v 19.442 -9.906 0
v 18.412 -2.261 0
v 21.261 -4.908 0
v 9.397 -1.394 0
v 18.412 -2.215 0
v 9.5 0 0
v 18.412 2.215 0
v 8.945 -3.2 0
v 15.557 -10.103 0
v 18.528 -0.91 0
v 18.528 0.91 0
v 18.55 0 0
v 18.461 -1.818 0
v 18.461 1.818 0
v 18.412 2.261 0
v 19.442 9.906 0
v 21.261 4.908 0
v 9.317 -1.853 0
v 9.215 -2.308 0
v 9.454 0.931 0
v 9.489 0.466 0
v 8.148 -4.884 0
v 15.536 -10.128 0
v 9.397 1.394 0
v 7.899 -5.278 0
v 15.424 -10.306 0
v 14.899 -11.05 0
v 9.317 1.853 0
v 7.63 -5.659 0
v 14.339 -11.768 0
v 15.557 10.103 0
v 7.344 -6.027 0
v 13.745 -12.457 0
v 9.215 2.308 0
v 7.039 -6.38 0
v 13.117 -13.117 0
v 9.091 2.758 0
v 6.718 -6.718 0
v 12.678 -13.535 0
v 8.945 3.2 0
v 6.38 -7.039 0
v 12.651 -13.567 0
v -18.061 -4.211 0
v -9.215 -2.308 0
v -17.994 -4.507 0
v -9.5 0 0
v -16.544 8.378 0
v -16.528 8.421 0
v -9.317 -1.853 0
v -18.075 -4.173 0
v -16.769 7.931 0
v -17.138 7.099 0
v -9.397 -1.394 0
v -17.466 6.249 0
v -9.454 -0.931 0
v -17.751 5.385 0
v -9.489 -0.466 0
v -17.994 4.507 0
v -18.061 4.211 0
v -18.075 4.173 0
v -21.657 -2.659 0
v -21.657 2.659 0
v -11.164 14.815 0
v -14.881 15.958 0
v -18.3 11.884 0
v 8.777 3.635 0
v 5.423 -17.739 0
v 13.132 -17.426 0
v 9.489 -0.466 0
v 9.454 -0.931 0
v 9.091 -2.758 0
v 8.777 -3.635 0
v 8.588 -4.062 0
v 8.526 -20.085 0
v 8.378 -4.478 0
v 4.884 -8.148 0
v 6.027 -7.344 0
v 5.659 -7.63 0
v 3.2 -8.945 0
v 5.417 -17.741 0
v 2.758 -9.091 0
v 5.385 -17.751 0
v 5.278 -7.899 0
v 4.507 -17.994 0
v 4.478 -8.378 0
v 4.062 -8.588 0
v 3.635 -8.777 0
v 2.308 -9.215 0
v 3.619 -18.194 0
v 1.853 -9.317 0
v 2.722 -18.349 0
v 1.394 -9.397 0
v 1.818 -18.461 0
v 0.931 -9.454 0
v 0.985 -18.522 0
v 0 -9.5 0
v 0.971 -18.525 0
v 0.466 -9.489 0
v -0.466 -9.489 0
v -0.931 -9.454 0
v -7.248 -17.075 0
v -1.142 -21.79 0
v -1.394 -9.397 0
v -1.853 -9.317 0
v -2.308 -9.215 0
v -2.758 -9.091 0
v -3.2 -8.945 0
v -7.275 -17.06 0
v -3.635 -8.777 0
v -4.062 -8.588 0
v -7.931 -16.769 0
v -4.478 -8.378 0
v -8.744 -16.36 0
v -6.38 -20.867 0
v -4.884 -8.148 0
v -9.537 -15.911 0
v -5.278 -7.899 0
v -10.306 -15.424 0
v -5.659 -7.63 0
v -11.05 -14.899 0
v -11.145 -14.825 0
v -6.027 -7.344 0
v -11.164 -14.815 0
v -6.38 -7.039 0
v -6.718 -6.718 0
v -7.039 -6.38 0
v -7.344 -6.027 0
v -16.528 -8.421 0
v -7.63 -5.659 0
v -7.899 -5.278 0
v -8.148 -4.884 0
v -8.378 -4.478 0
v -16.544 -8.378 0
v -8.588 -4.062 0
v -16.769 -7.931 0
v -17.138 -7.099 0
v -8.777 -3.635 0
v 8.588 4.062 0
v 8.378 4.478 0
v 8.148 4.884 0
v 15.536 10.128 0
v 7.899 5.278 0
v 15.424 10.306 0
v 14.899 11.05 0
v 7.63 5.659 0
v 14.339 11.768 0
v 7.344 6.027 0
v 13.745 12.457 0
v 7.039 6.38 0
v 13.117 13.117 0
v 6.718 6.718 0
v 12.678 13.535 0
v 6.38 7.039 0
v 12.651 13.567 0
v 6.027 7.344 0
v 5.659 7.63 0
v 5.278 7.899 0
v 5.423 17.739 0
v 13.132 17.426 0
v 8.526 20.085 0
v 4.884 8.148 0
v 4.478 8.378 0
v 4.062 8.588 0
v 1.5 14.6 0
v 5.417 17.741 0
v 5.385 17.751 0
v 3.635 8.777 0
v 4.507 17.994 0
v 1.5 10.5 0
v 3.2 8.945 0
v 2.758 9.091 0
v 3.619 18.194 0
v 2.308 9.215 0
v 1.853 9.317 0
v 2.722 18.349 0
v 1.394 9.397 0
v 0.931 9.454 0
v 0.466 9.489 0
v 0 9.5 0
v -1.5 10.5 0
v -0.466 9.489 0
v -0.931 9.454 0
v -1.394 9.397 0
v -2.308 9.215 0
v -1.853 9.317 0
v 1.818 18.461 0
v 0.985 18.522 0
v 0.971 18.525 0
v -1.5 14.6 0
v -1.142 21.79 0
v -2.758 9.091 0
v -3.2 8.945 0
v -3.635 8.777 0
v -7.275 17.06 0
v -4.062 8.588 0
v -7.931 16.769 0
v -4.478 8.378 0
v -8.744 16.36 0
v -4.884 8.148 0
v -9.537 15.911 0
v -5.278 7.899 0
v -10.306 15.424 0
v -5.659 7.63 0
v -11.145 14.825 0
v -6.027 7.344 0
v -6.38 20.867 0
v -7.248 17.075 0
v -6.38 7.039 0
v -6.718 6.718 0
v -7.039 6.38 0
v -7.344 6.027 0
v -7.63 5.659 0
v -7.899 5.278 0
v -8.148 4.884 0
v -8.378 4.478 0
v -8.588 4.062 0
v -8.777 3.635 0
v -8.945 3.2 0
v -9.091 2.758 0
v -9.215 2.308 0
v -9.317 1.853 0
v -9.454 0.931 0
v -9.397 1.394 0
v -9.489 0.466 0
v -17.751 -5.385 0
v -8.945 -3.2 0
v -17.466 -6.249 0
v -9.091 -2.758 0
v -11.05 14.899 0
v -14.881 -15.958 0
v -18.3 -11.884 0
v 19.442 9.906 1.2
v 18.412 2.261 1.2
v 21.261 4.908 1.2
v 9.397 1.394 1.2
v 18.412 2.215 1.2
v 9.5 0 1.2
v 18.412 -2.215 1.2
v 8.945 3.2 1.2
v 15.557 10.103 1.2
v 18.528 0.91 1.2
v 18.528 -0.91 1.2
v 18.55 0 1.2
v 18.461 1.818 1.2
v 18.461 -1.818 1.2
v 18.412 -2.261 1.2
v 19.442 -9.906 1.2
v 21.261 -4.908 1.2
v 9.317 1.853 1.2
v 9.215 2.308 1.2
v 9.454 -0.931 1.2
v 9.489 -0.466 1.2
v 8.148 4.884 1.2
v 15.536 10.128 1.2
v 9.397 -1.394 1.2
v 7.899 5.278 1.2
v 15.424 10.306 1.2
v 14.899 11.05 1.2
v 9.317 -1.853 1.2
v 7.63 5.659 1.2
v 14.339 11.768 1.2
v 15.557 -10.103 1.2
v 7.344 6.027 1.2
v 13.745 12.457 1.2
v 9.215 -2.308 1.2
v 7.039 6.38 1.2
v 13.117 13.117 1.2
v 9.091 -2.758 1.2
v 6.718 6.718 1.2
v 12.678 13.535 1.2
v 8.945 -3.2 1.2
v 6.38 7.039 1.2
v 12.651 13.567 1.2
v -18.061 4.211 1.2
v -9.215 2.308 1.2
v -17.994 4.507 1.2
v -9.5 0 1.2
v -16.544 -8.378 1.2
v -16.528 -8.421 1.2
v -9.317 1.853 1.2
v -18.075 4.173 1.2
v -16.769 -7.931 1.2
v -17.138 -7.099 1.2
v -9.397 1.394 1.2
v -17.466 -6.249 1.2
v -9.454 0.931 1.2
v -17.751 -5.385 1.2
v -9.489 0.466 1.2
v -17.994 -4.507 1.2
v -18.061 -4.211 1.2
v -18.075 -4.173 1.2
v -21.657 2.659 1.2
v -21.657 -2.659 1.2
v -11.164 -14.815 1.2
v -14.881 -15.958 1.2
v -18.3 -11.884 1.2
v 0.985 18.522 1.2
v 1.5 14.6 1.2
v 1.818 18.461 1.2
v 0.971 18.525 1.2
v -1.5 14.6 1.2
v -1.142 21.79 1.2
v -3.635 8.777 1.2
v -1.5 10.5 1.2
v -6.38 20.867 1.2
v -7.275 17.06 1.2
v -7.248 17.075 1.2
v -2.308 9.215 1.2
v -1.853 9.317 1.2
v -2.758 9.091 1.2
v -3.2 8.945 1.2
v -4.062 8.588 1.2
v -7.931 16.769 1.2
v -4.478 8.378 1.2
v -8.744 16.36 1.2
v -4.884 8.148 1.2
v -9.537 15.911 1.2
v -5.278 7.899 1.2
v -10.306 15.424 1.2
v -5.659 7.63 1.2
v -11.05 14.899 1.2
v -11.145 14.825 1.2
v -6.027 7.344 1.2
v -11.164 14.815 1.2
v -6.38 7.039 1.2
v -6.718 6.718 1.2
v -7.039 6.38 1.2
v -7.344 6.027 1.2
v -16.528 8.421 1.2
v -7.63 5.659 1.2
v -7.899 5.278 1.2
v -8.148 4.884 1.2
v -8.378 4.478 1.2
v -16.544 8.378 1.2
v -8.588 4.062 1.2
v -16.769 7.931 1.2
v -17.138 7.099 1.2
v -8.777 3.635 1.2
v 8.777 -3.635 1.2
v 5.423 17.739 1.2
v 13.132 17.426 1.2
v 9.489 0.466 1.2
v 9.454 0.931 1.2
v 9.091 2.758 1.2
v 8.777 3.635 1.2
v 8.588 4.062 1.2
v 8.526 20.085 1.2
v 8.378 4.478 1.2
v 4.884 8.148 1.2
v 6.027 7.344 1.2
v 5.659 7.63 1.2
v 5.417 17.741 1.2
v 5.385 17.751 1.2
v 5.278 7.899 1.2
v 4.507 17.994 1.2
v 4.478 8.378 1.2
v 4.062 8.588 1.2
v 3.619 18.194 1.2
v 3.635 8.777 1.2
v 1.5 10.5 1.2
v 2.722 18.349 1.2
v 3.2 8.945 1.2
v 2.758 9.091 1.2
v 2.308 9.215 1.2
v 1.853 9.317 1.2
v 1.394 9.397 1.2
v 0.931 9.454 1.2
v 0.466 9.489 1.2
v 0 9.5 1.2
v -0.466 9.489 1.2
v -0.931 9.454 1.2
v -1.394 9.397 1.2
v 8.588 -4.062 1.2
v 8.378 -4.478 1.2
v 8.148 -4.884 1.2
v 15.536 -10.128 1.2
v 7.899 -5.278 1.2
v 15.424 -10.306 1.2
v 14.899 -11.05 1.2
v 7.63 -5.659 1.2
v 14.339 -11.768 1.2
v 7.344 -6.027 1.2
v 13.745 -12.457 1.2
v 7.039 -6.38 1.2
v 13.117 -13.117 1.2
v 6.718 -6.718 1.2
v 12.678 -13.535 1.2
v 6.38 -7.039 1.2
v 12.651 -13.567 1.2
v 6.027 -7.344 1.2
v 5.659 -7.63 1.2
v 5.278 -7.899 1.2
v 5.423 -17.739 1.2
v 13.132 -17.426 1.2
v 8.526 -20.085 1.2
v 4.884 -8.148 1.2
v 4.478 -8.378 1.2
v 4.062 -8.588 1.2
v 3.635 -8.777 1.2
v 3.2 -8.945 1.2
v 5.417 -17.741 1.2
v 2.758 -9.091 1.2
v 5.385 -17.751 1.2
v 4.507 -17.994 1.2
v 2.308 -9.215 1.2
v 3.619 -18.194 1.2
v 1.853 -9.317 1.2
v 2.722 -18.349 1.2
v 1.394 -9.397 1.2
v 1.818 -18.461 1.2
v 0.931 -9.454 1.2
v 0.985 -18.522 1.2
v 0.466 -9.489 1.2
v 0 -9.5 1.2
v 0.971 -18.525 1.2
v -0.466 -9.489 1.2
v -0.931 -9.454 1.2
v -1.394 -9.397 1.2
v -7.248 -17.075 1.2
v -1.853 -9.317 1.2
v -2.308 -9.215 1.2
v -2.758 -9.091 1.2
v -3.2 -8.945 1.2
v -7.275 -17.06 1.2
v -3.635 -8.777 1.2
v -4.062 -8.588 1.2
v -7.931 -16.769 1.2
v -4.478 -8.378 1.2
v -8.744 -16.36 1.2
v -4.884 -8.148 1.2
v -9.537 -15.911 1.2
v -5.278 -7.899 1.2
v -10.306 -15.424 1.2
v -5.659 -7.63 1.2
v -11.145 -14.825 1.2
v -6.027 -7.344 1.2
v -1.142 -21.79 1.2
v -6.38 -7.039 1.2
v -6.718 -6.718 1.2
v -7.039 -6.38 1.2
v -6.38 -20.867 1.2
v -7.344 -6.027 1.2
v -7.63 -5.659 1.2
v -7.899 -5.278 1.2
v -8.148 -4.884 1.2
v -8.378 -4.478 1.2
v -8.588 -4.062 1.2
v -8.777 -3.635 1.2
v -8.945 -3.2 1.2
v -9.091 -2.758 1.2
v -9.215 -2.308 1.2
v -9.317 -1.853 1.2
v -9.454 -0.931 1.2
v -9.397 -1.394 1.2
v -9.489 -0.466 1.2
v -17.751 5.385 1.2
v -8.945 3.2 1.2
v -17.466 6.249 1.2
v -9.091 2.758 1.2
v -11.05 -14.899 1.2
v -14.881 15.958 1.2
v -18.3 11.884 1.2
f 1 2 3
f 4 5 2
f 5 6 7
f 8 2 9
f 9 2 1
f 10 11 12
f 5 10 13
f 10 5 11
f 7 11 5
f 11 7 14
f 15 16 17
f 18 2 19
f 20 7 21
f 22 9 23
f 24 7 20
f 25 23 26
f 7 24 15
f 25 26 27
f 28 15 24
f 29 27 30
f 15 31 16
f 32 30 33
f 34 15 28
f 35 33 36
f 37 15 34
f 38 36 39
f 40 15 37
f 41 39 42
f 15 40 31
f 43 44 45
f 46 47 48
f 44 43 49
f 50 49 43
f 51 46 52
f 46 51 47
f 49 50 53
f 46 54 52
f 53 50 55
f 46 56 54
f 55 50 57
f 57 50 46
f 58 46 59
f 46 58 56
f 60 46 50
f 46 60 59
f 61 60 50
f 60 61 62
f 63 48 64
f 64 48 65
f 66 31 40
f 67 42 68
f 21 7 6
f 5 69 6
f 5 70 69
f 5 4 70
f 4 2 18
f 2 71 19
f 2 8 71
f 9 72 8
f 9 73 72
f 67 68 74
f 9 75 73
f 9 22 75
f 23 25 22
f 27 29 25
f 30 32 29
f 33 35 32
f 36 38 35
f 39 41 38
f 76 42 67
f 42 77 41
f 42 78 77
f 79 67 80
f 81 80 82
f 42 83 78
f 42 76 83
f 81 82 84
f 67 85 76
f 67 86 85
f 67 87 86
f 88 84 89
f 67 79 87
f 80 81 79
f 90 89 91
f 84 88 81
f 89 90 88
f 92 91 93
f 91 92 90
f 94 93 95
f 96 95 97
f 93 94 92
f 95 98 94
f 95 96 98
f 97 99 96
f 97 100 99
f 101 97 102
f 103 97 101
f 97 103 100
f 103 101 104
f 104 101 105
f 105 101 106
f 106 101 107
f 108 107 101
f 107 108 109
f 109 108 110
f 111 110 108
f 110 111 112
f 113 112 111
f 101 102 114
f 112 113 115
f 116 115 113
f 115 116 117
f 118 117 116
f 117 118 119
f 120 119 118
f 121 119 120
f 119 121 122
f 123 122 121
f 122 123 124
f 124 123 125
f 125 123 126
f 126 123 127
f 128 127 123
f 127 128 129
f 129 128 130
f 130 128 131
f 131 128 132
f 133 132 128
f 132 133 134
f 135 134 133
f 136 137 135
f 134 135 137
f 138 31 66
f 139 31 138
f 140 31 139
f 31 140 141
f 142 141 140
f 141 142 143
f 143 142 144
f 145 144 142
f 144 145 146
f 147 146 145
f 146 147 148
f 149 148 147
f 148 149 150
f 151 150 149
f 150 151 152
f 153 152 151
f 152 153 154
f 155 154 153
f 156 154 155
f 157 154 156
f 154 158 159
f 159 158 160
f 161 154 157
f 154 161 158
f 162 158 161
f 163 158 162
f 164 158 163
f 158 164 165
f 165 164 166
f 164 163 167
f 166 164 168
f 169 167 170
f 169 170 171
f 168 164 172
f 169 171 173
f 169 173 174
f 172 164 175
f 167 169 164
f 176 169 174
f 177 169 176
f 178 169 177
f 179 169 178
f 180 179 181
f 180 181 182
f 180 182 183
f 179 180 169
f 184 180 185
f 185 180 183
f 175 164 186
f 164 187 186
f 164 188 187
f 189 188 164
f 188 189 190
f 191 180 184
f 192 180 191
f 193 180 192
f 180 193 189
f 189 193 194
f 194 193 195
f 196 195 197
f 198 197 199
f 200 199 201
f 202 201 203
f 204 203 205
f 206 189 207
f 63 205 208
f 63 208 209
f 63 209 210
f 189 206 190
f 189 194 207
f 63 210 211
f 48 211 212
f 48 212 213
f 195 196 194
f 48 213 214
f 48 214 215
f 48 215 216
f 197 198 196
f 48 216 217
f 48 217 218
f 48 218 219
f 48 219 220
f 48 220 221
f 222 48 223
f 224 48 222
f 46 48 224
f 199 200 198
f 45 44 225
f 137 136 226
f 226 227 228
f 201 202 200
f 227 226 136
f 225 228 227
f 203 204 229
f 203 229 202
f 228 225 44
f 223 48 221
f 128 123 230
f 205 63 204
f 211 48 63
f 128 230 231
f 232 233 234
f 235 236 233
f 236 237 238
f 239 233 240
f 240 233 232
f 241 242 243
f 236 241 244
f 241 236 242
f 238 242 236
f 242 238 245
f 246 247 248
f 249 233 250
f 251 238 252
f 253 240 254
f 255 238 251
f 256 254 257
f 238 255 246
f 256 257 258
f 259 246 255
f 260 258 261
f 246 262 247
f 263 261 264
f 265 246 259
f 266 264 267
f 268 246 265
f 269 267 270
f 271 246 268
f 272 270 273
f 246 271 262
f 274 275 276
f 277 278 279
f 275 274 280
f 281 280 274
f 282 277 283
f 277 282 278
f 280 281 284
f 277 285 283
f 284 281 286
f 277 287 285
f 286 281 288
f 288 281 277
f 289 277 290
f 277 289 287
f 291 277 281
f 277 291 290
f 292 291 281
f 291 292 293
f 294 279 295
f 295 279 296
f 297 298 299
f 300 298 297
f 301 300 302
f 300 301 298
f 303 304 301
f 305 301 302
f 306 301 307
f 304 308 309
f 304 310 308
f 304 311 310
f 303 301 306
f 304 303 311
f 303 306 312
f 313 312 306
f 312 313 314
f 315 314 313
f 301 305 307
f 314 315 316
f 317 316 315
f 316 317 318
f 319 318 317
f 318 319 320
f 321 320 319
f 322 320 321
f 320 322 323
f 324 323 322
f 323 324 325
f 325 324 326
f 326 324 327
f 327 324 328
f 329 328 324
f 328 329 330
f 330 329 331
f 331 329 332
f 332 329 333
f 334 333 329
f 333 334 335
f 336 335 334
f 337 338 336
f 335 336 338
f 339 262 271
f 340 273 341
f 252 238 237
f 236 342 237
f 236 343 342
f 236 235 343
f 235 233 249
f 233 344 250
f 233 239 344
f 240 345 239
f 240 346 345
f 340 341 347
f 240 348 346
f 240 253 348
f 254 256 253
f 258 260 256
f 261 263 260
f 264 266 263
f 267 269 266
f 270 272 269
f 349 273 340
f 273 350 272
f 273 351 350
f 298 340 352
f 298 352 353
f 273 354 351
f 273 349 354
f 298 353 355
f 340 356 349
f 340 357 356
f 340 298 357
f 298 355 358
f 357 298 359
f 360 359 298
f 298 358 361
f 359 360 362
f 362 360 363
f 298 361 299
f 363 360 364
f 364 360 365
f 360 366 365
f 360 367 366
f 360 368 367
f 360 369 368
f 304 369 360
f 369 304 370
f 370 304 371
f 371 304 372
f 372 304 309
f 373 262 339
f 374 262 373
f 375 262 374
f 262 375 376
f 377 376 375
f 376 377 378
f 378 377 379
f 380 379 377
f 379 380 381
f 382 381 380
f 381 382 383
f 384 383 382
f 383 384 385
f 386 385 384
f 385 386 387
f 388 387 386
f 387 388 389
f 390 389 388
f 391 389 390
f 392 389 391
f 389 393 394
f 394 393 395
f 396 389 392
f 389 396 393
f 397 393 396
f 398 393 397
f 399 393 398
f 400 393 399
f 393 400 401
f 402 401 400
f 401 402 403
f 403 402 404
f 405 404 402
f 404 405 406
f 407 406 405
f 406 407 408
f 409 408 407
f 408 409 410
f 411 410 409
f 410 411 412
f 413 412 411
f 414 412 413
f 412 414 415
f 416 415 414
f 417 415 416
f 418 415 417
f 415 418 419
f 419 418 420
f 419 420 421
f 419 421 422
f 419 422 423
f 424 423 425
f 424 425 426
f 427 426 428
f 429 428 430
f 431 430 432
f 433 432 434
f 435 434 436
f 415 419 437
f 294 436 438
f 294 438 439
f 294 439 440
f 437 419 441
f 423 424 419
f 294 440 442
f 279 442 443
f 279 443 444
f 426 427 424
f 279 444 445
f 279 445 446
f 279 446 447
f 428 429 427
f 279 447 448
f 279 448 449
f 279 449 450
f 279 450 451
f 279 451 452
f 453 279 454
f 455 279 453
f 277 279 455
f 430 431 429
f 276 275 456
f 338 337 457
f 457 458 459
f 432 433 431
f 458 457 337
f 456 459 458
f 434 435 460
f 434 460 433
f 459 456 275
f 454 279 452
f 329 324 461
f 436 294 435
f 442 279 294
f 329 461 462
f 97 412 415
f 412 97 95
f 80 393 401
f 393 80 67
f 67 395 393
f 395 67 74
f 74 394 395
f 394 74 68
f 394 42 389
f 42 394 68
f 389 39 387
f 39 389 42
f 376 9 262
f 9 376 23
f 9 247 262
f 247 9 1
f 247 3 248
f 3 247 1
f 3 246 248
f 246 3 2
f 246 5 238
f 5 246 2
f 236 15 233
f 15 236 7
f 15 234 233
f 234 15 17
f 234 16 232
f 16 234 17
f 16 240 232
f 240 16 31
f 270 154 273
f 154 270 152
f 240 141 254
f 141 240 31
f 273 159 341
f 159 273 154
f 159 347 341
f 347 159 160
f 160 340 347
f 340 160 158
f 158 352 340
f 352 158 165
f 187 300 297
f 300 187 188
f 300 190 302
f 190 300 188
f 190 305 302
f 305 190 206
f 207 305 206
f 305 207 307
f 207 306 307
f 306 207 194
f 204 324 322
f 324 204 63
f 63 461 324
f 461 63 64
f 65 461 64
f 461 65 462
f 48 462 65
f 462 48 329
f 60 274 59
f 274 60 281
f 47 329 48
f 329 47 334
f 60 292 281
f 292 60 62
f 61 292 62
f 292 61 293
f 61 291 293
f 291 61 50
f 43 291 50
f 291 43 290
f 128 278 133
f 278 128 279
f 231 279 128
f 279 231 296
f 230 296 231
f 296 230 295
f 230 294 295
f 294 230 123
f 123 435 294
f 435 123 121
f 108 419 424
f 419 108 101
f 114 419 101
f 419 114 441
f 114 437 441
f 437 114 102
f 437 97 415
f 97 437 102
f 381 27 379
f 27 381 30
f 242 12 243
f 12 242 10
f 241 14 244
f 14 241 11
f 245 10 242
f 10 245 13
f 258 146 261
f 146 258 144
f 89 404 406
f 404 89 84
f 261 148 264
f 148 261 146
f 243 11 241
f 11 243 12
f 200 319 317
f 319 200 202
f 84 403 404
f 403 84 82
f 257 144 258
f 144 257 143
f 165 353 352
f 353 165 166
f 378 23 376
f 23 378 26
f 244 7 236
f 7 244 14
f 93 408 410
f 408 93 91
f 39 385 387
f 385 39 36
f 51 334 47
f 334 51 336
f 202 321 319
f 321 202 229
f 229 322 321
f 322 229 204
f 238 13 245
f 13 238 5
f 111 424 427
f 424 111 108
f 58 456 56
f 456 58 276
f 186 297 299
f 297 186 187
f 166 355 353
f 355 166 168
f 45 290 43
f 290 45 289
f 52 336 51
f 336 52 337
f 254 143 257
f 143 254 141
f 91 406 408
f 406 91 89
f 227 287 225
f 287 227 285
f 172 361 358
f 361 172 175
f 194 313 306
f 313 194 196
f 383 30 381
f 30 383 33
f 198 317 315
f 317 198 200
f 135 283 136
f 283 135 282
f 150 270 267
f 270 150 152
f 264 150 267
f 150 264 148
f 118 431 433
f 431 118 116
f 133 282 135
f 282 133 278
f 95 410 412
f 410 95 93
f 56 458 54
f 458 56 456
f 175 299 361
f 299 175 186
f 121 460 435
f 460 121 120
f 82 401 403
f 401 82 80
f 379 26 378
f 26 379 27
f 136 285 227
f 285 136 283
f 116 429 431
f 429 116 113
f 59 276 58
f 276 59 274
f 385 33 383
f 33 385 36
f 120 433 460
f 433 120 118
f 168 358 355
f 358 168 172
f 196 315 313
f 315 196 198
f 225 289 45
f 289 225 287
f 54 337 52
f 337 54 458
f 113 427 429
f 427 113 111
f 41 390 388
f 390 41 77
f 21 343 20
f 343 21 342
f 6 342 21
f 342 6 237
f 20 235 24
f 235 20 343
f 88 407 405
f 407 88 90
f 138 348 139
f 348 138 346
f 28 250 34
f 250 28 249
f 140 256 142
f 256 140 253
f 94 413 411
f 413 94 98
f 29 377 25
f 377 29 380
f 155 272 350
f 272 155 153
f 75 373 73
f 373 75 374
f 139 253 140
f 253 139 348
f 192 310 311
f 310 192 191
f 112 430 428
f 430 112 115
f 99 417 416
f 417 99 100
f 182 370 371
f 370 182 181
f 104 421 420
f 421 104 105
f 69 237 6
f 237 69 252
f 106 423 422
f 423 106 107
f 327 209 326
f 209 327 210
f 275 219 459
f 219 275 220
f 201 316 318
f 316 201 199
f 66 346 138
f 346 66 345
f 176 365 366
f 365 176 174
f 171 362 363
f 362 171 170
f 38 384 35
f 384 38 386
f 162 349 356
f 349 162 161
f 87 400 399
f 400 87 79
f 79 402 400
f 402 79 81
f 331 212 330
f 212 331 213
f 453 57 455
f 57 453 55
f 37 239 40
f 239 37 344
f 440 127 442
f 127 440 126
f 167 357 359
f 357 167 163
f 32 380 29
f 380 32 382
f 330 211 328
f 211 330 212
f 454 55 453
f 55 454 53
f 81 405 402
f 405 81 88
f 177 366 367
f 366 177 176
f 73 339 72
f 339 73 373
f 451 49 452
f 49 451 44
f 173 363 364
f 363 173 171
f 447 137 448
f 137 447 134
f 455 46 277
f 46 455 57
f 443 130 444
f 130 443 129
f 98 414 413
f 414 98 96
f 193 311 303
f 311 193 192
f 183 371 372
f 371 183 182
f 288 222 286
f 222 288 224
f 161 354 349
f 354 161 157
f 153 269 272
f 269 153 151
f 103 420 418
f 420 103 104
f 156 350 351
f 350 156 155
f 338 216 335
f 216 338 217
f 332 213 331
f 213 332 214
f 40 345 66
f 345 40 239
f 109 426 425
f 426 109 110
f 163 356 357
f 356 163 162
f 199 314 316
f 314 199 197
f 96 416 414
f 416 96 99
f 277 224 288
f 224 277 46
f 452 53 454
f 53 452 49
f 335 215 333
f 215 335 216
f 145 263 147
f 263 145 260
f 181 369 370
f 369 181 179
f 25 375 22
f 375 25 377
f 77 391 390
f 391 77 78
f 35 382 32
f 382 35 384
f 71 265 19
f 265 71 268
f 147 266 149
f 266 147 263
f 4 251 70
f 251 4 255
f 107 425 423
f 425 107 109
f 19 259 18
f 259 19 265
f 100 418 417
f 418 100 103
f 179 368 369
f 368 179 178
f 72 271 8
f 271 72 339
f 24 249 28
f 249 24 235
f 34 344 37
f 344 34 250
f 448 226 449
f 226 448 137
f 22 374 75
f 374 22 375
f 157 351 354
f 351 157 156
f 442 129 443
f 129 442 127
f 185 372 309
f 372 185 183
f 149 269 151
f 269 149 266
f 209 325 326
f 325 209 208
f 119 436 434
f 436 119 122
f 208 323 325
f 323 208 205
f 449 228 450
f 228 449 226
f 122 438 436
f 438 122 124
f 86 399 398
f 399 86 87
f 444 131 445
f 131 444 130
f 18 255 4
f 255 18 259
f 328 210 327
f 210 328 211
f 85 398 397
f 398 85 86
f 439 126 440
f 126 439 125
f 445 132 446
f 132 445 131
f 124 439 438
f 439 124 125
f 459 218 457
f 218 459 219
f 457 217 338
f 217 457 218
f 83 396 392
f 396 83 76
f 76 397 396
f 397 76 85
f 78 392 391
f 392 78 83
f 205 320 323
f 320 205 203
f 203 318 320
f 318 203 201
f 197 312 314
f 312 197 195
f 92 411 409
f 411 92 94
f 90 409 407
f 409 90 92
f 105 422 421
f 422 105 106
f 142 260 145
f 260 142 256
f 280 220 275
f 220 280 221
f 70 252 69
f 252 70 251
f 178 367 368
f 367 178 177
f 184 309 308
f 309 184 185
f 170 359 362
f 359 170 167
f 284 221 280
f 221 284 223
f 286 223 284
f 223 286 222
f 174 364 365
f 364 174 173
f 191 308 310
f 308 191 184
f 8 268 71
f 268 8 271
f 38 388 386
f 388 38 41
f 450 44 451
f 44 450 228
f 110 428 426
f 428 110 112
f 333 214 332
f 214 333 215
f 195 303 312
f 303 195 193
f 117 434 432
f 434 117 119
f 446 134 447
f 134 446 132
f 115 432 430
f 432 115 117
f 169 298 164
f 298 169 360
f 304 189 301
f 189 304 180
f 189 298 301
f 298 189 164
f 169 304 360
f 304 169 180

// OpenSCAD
/*
  Elna Supermatic cam 19
  Name: Dense zigzag
  Status: candidate

  Generated from measured parametric base v2.
  Surface mode: stepped
*/

include <_elna_measured_common.scad>;

profile_points = [
        [0.9708, 18.5246],
        [5.4235, 17.7395],
        [8.5258, 20.0854],
        [13.1316, 17.4262],
        [12.6511, 13.5666],
        [15.5573, 10.1031],
        [19.4418, 9.9061],
        [21.2608, 4.9084],
        [18.4117, 2.2607],
        [18.4117, -2.2607],
        [21.2608, -4.9084],
        [19.4418, -9.9061],
        [15.5573, -10.1031],
        [12.6511, -13.5666],
        [13.1316, -17.4262],
        [8.5258, -20.0854],
        [5.4235, -17.7395],
        [0.9708, -18.5246],
        [-1.1420, -21.7901],
        [-6.3796, -20.8666],
        [-7.2481, -17.0754],
        [-11.1637, -14.8147],
        [-14.8812, -15.9581],
        [-18.2998, -11.8840],
        [-16.5282, -8.4215],
        [-18.0746, -4.1728],
        [-21.6574, -2.6592],
        [-21.6574, 2.6592],
        [-18.0746, 4.1728],
        [-16.5282, 8.4215],
        [-18.2998, 11.8840],
        [-14.8812, 15.9581],
        [-11.1637, 14.8147],
        [-7.2481, 17.0754],
        [-6.3796, 20.8666],
        [-1.1420, 21.7901]
];

icon_points = [[-1.000,0.180], [-0.920,0.820], [-0.840,0.180], [-0.778,0.180], [-0.698,0.820], [-0.618,0.180], [-0.556,0.180], [-0.476,0.820], [-0.396,0.180], [-0.333,0.180], [-0.253,0.820], [-0.173,0.180], [-0.111,0.180], [-0.031,0.820], [0.049,0.180], [0.111,0.180], [0.191,0.820], [0.271,0.180], [0.333,0.180], [0.413,0.820], [0.493,0.180], [0.556,0.180], [0.636,0.820], [0.716,0.180], [0.778,0.180], [0.858,0.820], [0.938,0.180], [1.000,0.180]];

elna_cam_ring(profile_points=profile_points);
